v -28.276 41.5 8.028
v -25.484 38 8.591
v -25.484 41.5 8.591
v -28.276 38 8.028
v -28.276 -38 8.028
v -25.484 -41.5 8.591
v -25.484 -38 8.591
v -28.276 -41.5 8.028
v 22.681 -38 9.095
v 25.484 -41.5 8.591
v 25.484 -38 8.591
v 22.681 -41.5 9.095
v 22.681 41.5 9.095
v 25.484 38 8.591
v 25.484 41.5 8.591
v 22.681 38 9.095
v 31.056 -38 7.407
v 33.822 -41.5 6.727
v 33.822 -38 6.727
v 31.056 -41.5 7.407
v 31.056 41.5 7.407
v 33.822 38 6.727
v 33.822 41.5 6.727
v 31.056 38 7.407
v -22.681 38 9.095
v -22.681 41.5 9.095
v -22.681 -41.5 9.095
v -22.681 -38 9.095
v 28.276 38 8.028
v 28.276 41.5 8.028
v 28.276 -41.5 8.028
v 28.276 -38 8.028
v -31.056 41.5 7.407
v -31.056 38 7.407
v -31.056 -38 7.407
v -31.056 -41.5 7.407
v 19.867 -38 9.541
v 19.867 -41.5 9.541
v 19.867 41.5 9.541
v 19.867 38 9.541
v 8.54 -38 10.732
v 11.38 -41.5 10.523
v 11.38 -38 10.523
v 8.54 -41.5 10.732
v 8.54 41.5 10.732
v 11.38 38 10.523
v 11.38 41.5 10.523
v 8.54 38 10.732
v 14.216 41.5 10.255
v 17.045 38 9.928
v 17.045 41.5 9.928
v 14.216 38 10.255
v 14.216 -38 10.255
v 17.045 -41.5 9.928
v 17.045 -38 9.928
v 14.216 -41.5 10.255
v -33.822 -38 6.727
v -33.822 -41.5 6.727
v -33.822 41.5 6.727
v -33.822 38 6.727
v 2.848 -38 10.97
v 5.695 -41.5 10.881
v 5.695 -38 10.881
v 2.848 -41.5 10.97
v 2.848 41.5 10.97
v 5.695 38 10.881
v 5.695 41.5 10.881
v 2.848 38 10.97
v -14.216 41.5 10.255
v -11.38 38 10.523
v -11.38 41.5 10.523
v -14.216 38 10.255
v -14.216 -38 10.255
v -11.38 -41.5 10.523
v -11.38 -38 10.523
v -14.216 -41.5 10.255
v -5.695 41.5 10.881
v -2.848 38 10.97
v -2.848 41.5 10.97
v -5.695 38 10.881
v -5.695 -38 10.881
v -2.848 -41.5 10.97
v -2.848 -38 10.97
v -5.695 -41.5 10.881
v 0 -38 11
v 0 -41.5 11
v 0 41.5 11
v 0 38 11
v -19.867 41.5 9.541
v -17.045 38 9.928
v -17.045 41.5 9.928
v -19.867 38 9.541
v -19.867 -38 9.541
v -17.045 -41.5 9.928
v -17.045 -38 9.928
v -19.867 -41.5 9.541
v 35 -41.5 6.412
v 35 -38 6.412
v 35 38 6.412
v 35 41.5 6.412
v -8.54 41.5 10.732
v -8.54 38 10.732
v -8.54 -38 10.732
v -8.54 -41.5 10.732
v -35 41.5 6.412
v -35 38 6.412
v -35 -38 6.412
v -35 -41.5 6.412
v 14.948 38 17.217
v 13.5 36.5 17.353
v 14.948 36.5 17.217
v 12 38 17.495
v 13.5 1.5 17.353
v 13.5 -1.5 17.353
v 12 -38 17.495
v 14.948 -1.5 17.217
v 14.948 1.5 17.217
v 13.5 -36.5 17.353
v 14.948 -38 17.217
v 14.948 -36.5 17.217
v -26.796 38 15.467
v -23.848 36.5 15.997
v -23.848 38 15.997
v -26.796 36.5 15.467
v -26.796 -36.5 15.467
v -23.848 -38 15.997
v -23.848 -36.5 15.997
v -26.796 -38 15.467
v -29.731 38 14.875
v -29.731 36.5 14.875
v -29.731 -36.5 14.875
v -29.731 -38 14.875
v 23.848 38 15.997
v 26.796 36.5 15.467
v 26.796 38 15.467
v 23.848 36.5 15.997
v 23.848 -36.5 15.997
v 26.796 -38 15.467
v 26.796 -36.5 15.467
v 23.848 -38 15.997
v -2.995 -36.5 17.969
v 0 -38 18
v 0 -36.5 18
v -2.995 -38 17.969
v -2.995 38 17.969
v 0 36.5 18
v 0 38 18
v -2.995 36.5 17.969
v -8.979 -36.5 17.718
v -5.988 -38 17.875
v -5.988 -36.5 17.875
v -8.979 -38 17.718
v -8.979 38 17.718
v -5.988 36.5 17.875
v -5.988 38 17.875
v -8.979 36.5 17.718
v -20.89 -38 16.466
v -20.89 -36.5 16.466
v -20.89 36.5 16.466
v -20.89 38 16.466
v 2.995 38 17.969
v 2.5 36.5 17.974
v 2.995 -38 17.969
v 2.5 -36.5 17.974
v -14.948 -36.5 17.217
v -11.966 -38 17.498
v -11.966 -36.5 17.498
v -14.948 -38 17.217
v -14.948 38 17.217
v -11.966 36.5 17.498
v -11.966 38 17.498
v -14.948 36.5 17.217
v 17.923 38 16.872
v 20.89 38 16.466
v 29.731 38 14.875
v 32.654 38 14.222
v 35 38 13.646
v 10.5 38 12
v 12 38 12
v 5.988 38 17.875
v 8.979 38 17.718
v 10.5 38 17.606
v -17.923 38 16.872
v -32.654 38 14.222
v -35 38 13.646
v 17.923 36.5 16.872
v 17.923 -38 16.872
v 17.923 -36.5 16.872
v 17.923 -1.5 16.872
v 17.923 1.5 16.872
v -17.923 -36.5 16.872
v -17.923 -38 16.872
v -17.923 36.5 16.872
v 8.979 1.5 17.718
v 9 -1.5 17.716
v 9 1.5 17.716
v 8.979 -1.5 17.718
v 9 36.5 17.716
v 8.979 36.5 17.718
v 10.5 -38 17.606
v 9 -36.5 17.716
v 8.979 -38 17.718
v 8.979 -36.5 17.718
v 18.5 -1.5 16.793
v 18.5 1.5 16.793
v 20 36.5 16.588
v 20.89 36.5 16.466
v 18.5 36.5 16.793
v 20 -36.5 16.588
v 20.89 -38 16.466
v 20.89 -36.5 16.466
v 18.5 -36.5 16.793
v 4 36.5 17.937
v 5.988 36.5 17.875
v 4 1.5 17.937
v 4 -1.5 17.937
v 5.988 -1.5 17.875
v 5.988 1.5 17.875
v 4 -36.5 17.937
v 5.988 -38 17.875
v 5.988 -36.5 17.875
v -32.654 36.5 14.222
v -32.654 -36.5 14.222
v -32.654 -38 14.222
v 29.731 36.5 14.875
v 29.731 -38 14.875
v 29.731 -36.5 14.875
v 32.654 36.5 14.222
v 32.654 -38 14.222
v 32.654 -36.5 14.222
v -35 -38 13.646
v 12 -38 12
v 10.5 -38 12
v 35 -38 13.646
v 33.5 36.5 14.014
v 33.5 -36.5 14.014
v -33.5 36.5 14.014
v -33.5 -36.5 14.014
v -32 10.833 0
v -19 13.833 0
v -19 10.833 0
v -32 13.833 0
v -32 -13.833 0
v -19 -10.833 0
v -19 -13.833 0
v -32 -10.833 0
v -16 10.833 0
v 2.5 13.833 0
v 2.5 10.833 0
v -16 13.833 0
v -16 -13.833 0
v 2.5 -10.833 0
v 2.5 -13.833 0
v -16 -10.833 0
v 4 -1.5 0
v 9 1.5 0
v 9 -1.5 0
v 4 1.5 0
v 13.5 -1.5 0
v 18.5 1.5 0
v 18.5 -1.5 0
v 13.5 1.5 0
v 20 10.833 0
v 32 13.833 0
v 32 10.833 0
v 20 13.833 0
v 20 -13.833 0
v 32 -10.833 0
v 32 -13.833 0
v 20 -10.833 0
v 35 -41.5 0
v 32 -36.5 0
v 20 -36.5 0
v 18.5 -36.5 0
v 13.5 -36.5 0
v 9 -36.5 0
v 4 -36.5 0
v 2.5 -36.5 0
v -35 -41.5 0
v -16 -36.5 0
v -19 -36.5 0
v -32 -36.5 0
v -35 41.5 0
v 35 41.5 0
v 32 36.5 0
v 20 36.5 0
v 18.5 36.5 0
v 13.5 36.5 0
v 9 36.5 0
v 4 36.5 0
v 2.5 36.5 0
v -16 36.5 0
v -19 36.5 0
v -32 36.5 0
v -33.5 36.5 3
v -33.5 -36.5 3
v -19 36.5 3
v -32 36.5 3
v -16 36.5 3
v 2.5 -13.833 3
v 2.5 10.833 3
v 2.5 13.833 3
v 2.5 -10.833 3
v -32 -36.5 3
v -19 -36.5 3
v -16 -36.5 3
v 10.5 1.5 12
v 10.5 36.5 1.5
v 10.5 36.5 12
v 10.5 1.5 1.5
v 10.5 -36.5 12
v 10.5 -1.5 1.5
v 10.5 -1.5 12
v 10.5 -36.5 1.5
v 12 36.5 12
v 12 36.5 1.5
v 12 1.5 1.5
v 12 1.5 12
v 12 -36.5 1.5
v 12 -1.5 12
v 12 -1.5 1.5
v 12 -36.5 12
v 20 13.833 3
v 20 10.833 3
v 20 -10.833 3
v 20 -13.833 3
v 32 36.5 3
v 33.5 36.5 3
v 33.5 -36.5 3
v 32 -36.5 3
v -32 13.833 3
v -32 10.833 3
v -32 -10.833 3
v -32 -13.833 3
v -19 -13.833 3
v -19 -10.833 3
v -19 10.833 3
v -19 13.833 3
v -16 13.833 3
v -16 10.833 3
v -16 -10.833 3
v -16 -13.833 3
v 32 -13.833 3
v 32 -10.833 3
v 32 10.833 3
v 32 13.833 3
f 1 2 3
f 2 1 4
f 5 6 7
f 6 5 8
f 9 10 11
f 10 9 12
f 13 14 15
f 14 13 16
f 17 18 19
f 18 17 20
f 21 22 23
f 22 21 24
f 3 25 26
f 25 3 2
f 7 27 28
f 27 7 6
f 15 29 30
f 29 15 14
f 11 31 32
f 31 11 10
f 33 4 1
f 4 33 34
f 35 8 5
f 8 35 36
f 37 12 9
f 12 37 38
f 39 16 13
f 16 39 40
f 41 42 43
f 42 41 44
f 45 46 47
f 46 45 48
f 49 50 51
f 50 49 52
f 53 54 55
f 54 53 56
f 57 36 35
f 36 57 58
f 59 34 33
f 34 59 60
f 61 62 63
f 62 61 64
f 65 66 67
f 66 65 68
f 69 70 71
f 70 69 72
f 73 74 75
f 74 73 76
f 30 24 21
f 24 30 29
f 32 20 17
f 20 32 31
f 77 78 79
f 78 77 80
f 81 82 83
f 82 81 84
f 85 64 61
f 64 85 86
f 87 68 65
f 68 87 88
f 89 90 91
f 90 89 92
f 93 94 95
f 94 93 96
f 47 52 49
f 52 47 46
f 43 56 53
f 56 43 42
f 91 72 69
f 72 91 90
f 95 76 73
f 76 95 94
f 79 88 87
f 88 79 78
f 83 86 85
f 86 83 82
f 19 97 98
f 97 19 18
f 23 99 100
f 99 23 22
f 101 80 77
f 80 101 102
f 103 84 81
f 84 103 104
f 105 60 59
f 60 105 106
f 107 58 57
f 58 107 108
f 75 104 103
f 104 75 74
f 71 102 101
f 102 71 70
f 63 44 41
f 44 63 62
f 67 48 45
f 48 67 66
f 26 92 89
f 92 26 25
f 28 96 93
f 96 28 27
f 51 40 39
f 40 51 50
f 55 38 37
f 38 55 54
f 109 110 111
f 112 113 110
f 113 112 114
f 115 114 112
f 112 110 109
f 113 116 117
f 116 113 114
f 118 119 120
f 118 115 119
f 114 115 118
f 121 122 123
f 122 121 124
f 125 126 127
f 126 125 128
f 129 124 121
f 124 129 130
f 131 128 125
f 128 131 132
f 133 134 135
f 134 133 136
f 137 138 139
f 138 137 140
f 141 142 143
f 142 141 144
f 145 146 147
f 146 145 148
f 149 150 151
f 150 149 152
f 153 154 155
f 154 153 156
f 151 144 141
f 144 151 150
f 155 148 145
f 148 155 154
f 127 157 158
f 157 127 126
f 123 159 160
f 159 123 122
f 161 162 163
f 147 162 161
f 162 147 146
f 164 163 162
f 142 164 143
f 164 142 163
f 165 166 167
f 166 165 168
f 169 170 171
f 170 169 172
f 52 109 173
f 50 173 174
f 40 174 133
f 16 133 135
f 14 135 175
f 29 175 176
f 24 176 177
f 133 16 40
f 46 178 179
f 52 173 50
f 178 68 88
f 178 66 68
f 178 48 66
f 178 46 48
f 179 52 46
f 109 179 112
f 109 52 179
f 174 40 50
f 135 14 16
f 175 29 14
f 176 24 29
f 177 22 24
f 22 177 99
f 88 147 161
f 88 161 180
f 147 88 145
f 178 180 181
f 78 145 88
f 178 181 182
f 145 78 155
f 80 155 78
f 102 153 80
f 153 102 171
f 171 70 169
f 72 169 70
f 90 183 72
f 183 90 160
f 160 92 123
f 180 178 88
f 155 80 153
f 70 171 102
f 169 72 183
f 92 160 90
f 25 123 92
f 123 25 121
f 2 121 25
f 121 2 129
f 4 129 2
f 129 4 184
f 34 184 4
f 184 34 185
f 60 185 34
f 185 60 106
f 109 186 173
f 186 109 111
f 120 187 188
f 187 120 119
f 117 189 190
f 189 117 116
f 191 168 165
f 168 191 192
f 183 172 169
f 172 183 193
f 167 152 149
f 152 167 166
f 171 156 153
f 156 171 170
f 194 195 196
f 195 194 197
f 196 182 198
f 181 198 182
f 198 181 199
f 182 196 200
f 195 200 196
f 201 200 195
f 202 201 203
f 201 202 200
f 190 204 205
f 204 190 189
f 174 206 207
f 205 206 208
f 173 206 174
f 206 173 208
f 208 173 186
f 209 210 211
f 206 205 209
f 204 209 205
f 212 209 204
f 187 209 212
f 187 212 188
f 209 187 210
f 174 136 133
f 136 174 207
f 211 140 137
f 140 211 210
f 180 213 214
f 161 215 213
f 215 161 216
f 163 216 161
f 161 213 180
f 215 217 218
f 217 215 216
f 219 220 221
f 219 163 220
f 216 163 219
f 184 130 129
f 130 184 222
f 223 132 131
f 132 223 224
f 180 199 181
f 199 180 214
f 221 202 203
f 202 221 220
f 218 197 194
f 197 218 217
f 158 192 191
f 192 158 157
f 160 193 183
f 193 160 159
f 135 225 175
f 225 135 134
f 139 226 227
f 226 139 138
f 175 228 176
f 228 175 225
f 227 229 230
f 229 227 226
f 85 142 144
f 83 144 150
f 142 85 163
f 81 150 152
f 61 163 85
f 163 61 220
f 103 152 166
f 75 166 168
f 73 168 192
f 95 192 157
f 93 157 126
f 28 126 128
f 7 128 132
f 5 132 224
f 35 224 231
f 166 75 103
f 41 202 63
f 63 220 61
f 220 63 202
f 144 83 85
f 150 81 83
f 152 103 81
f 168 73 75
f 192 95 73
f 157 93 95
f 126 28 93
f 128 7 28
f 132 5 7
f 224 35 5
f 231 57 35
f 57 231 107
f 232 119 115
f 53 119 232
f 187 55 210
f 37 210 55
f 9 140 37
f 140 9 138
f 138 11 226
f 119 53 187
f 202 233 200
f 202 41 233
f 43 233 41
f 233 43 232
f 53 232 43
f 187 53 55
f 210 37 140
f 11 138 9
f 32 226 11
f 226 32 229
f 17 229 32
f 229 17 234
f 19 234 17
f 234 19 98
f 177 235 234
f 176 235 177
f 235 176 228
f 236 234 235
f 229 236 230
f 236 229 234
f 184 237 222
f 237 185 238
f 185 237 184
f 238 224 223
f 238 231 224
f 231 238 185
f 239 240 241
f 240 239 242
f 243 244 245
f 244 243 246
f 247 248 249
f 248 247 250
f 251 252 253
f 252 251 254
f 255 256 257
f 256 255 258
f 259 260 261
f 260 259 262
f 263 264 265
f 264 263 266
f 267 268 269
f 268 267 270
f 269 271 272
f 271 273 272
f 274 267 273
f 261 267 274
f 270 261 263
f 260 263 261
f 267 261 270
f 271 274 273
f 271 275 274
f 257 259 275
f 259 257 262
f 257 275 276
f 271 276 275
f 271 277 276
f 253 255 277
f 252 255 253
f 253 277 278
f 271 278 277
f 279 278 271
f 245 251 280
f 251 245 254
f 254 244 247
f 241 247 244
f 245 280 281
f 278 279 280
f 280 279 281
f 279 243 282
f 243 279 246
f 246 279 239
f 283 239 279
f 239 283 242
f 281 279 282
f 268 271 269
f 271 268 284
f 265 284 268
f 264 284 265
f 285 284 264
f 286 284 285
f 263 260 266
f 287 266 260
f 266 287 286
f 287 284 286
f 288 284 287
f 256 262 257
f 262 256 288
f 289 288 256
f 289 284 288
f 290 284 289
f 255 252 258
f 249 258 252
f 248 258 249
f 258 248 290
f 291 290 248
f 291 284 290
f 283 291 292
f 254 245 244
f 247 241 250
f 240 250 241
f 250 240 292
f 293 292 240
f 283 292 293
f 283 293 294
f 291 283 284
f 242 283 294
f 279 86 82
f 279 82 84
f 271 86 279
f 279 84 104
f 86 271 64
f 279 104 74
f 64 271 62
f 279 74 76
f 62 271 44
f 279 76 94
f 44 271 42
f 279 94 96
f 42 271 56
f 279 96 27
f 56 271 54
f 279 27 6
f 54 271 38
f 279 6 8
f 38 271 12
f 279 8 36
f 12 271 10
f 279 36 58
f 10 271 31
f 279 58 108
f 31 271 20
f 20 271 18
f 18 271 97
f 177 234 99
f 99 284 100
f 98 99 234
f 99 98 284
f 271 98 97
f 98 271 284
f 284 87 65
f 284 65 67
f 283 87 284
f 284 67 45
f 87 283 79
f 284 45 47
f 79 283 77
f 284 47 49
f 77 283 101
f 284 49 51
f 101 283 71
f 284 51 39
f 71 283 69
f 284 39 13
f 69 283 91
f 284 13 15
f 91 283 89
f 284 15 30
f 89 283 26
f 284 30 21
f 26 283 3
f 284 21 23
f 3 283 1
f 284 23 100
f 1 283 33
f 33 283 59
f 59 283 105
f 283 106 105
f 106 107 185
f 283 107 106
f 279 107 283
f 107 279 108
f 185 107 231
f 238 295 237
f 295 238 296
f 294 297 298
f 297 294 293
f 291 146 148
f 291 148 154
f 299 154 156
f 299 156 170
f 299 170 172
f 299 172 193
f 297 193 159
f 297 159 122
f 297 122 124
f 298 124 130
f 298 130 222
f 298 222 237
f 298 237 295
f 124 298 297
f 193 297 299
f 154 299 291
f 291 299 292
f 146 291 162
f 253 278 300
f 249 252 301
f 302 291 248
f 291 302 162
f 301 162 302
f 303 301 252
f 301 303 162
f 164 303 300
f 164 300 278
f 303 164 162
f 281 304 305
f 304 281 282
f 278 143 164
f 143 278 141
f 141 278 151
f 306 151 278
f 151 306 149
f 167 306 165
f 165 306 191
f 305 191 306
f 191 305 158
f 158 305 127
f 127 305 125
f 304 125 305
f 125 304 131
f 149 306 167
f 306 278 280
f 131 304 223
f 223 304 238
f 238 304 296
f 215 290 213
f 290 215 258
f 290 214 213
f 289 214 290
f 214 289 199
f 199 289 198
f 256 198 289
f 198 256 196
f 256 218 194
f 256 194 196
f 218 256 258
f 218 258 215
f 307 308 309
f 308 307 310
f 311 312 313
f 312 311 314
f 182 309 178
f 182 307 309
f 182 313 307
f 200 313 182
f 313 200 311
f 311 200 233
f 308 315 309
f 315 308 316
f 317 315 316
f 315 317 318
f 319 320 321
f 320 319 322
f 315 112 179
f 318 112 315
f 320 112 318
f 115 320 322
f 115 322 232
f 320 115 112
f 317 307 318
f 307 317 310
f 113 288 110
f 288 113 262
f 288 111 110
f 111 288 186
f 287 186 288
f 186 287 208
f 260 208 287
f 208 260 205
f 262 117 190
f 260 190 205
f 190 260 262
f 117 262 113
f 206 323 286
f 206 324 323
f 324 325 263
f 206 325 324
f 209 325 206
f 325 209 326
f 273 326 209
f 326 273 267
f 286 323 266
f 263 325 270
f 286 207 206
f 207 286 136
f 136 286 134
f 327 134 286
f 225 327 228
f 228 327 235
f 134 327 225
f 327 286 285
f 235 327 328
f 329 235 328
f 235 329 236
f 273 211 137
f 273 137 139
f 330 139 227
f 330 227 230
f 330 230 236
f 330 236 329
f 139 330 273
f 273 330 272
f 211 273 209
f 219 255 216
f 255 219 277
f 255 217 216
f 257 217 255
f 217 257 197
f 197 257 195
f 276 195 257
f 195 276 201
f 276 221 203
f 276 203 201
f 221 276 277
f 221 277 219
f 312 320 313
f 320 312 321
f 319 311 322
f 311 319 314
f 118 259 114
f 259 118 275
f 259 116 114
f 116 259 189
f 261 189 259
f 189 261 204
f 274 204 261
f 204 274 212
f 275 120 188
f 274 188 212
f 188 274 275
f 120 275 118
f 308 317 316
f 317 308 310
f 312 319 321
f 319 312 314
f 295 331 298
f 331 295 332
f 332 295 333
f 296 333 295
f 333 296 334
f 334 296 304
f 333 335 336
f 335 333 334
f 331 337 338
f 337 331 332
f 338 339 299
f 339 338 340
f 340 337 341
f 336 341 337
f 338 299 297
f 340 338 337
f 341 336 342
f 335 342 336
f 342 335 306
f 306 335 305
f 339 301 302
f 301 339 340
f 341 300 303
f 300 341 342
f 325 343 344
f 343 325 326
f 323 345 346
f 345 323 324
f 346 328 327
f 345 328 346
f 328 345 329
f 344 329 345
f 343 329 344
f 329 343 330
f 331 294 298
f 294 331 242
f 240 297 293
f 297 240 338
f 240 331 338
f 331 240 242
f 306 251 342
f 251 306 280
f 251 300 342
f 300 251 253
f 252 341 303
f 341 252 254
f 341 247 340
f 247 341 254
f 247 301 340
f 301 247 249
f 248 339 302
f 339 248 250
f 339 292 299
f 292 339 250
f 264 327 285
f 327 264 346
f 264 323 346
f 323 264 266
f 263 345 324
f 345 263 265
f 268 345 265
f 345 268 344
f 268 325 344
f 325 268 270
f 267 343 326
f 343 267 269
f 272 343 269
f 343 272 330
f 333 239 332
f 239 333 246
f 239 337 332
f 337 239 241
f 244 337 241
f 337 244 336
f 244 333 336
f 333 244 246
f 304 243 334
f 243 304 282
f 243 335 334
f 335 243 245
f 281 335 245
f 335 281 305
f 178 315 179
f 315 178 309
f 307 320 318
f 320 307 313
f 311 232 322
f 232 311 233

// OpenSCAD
echo(version=version());

$fn = 300;

eps = 0.001;
shift = 22.5 / 2;
x = 70; 
y = 83;
r = 136;

color("green")
difference() {
    intersection() {
        translate([0, 0, 11-r]) rotate([90,0,0]) {
            
            // difference() {
            //     cylinder(h=y+eps, r=r, center=true);
            //     cylinder(h=y+2*eps, r=r-4, center=true);
            // }
            cylinder(h=y+eps, r=r, center=true);
            cylinder(h=y-7, r=r+7, center=true);
        }
        union() {
            linear_extrude(height = 20) {
                    difference() {
                        square([x, y], center = true);
                        square([x - 3, y - 10], center = true);
                    }
                    translate([shift + 1.5, 0]) 
                        square([1.5, y], center = true);
                    translate([shift - 1.5, 0]) 
                        square([1.5, y], center = true);
                    translate([shift + 8, 0]) 
                        square([1.5, y], center = true);
                    translate([shift - 8, 0]) 
                        square([1.5, y], center = true);
                    translate([shift, 0]) 
                        square([16, 3], center = true);
                    // translate([shift + 4.75, 0]) 
                    //     square([8, 3], center = true);
                    // translate([shift - 4.75, 0]) 
                    //     square([8, 3], center = true);
                };
            linear_extrude(height = 1.5)
                translate([shift, 0]) 
                    square([1.5 + eps, y], center = true);
            linear_extrude(height = 3) {
                    difference() {
                        square([x - eps, y - eps], center = true);
                        square([x - 6, y - 6], center = true);
                    }
                    translate([-x/4, 0]) 
                        square([3, y - eps], center = true);
                    translate([-x/2,  y/6 - 3]) 
                        square([x/2 + shift - 8, 3]);
                    translate([-x/2, -y/6]) 
                        square([x/2 + shift - 8, 3]);
                    translate([shift + 8,  y/6 - 3]) 
                        square([x/2 - shift - 8, 3]);
                    translate([shift + 8, -y/6]) 
                        square([x/2 - shift - 8, 3]);
                }
        };
    }
    translate([shift, 0, 12]) linear_extrude(10) square([1.5, y], center = true);
}
